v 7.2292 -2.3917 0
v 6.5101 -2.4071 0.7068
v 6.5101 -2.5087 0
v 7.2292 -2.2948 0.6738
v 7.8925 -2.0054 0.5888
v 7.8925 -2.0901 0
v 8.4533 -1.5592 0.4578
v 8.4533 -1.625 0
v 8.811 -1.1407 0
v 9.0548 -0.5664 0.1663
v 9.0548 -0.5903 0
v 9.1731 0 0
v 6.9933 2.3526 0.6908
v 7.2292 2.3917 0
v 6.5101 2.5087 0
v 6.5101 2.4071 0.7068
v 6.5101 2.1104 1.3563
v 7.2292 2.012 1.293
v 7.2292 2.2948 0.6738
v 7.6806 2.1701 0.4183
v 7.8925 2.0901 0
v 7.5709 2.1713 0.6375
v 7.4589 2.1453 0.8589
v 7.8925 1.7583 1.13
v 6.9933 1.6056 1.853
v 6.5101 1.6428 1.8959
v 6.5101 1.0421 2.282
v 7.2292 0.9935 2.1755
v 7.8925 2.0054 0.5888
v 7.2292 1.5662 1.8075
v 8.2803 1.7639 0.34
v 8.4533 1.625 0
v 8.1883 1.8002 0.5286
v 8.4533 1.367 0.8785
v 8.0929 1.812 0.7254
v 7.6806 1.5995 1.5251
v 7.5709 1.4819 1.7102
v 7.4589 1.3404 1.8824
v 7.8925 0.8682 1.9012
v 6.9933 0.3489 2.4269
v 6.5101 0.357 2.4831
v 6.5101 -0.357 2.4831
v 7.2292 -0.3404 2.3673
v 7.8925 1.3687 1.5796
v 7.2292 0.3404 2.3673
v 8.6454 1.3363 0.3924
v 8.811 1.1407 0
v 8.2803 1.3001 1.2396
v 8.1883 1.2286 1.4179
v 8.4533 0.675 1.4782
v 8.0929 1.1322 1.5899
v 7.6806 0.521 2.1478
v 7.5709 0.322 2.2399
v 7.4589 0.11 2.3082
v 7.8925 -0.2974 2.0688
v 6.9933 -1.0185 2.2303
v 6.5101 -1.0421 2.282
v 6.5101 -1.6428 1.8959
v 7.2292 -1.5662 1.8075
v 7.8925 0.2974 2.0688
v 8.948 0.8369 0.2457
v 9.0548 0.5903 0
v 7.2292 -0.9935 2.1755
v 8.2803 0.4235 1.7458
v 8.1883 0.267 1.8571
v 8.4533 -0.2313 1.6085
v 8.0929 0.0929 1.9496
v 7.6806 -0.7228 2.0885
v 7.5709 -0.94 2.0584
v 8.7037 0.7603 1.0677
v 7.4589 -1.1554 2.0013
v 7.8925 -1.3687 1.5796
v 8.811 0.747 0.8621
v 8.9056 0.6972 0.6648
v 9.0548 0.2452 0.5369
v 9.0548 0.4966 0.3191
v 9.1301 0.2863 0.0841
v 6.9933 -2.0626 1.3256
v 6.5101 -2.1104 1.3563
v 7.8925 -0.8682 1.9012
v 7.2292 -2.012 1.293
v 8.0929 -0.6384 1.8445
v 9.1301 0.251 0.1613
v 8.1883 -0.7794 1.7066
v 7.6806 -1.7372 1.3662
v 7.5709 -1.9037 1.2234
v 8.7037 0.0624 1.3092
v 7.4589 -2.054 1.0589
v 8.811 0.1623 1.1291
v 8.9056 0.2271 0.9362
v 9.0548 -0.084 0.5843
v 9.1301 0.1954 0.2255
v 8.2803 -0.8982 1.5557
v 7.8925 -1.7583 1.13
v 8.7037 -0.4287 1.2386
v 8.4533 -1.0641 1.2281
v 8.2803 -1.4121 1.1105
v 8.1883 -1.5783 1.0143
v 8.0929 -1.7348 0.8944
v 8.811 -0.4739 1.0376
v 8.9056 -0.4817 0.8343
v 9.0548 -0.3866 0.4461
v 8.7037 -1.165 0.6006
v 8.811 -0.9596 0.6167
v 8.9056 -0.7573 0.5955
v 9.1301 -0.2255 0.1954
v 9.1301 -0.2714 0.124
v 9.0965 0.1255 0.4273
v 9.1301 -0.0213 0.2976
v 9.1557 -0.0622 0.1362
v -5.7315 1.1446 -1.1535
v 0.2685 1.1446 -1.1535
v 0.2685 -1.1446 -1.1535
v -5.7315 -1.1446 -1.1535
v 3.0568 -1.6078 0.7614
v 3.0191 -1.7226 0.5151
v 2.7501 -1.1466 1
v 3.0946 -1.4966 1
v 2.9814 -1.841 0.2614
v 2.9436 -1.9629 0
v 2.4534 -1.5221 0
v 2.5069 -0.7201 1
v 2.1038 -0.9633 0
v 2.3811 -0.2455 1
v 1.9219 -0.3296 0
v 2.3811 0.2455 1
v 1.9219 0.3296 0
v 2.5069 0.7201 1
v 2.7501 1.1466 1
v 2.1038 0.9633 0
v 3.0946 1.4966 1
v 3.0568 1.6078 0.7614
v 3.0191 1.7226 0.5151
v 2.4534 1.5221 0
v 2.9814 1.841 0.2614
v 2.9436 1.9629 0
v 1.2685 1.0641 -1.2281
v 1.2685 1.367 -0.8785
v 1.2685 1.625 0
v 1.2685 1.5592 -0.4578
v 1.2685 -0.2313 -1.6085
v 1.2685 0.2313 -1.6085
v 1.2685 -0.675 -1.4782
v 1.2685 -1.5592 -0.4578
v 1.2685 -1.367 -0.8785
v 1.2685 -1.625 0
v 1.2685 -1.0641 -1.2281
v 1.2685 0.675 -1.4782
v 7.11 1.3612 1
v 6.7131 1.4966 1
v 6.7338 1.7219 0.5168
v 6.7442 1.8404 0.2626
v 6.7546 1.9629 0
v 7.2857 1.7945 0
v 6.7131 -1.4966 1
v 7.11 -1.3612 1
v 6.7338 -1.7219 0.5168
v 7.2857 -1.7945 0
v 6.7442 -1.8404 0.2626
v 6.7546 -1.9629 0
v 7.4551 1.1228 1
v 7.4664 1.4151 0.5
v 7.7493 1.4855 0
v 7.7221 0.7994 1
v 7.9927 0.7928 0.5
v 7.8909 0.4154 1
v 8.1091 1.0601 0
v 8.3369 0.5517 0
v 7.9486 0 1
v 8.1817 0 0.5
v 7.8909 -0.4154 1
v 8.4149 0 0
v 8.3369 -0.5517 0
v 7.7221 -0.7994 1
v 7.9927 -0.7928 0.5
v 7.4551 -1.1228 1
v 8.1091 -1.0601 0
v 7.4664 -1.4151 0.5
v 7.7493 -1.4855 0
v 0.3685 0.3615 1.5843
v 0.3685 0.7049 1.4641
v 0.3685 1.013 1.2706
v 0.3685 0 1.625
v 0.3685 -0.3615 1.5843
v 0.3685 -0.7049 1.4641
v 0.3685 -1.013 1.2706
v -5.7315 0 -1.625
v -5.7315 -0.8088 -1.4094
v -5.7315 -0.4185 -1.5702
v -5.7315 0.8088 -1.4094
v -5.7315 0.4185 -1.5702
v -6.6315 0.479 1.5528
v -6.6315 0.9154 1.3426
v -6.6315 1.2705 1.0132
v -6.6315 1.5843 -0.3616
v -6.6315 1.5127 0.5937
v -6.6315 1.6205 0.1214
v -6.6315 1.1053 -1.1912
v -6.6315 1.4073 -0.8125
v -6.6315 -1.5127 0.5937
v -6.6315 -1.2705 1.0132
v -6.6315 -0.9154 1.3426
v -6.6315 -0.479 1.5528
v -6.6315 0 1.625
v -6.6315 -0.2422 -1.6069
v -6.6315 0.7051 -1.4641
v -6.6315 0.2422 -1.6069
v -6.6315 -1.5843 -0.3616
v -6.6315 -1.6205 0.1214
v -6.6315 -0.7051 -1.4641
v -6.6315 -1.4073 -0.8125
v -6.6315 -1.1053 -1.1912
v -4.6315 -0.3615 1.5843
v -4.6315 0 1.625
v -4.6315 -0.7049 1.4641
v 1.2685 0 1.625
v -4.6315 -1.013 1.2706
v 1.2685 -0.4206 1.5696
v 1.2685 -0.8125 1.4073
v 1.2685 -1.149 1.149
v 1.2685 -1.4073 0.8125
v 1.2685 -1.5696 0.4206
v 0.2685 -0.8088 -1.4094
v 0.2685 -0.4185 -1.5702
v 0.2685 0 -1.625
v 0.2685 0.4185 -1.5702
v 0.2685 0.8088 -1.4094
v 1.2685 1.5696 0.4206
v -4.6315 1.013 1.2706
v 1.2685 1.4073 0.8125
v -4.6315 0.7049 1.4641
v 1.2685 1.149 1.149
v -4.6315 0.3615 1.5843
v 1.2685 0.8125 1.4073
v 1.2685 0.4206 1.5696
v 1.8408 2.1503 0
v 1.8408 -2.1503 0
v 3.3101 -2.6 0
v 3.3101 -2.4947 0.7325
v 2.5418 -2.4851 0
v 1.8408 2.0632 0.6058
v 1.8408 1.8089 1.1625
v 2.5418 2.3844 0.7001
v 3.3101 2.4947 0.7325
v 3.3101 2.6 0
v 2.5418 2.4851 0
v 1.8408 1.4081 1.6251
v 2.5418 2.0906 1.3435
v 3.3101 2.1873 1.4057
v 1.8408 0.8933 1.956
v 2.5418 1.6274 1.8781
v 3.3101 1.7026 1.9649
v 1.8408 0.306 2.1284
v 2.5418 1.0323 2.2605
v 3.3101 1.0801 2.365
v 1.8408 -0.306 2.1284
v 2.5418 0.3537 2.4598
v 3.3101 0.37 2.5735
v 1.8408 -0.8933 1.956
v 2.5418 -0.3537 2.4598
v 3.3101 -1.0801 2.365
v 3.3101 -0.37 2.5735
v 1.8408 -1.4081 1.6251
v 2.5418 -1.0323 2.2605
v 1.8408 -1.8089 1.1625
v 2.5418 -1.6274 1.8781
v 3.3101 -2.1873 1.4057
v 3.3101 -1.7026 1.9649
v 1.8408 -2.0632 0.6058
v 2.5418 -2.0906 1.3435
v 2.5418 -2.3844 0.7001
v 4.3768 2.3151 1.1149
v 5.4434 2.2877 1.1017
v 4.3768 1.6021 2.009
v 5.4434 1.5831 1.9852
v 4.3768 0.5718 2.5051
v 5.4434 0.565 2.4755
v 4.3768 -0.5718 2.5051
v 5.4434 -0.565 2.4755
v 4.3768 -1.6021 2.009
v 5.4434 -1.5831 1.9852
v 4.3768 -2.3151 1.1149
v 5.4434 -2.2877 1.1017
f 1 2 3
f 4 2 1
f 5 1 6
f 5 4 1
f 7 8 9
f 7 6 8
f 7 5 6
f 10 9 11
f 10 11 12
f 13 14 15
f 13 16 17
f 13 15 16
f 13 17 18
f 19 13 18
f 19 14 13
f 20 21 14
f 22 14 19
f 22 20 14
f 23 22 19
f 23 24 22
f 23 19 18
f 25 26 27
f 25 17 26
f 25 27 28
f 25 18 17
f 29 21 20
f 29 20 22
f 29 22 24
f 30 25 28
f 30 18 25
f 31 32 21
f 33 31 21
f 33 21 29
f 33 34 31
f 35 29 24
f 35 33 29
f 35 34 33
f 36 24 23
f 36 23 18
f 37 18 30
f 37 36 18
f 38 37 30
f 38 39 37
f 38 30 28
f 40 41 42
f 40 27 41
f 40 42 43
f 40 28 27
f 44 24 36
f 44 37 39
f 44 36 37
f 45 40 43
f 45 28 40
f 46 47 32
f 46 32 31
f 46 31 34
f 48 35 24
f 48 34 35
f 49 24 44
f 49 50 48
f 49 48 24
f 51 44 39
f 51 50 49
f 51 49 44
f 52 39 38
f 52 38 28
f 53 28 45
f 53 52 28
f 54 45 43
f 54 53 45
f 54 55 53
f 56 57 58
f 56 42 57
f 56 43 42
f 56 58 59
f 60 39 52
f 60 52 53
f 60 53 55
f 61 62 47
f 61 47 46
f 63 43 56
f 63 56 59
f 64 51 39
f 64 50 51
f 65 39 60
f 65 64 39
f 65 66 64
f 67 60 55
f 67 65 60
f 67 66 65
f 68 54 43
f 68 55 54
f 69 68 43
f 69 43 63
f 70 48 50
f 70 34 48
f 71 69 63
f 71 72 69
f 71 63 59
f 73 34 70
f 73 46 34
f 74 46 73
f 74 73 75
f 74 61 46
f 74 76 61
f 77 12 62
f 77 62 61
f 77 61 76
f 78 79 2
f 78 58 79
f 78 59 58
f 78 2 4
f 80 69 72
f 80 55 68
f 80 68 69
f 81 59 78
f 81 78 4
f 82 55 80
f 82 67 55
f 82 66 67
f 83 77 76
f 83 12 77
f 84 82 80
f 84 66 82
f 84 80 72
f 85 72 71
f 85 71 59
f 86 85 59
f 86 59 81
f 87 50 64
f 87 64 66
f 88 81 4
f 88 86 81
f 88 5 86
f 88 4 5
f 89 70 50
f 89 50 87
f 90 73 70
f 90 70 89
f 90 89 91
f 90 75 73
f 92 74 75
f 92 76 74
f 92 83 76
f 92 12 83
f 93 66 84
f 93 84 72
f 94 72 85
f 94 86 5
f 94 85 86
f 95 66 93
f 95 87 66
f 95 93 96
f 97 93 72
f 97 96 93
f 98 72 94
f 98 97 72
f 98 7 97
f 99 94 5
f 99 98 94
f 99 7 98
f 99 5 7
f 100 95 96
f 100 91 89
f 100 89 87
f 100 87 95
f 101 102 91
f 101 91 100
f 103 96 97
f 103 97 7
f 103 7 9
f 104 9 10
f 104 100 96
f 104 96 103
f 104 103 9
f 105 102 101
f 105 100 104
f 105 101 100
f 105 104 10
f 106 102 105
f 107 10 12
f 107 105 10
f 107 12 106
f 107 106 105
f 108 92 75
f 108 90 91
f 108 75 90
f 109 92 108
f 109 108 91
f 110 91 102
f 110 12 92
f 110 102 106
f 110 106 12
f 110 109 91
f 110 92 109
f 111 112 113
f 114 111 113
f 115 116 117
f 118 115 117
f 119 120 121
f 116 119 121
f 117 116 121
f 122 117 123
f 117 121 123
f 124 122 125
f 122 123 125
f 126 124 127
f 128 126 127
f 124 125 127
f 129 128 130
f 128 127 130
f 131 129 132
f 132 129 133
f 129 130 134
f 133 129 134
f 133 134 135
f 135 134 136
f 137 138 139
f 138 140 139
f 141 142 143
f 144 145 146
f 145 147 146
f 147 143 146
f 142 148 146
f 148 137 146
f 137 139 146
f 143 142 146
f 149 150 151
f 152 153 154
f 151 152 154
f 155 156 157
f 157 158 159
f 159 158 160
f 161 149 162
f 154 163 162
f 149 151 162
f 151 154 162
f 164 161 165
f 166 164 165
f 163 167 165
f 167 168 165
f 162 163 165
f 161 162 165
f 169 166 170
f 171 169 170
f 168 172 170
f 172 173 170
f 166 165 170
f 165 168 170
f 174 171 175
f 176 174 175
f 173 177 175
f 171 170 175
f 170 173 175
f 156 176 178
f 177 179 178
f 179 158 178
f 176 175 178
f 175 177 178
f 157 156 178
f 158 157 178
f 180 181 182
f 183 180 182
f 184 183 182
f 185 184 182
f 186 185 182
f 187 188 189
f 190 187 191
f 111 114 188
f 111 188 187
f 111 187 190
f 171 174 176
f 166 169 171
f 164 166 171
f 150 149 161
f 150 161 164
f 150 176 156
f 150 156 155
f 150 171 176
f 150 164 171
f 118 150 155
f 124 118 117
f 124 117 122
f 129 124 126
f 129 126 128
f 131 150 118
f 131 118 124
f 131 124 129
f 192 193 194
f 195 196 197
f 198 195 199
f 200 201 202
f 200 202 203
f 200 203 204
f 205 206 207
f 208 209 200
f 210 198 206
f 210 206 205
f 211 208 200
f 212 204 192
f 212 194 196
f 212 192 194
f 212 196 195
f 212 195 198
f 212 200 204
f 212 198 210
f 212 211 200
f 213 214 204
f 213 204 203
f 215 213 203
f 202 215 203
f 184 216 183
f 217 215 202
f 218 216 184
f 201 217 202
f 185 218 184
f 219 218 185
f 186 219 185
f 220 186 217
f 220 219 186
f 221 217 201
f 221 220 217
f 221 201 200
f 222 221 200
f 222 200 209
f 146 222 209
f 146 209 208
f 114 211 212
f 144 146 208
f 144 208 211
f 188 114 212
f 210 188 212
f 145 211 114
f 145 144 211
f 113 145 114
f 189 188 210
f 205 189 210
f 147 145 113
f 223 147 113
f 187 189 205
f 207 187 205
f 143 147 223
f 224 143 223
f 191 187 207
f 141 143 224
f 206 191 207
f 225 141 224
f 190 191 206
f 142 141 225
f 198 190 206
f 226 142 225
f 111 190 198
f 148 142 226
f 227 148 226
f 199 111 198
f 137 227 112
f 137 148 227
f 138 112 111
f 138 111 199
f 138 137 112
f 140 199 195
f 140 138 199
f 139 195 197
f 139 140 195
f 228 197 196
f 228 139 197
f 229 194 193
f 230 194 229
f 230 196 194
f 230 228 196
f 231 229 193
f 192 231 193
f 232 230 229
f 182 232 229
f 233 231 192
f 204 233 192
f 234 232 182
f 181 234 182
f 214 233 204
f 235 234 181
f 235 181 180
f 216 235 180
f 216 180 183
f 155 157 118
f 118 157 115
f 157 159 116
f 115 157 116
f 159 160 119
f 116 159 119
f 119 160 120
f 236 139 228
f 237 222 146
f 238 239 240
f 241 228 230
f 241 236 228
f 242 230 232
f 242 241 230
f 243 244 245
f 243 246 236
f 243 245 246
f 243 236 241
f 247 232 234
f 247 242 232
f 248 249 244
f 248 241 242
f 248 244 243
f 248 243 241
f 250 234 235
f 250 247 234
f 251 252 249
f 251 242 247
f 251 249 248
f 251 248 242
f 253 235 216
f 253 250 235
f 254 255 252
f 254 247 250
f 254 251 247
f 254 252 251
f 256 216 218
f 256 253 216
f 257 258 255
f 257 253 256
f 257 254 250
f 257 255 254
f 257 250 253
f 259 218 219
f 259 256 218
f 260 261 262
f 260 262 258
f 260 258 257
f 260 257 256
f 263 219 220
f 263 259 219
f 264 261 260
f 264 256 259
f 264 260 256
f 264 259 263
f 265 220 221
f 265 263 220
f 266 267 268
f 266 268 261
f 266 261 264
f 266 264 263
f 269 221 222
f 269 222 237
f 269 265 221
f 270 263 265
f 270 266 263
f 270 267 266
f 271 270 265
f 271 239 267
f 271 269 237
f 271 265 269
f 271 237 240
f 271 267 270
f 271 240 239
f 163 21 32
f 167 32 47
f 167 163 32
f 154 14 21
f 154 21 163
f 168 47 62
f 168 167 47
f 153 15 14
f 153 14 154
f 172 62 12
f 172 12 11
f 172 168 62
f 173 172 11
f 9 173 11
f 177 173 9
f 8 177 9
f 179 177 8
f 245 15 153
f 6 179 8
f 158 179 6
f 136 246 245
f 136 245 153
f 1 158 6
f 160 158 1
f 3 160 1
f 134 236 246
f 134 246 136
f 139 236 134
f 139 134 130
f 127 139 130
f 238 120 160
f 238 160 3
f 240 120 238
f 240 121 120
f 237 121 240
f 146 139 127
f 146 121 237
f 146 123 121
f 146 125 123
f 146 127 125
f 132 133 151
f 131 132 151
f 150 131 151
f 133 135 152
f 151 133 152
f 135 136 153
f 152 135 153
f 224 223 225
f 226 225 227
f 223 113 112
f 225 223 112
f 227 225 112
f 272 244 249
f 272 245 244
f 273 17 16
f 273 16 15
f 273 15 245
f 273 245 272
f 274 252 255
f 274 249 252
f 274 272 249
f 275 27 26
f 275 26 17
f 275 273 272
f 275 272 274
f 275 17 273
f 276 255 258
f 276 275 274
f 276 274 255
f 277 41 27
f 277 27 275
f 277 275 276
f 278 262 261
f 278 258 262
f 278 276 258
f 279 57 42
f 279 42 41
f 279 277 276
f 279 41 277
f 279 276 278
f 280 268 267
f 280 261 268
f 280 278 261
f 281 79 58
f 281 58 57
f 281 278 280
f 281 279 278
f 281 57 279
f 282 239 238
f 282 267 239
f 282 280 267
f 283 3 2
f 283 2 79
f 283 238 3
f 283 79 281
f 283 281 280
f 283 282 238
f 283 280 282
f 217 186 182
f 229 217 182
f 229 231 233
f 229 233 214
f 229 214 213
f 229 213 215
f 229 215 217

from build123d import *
from build123d.topology import SkipClean

# Parameters (mm, degrees)
CUT_EXTRUDE3_DEPTH = 17.226666346
CUT_EXTRUDE4_DEPTH = 10.882576389
CUT_EXTRUDE5_DEPTH = 1
CUT_EXTRUDE5_DRAFT = -25
CUT_EXTRUDE7_START = -7
CUT_EXTRUDE7_DEPTH = 5
CUT_EXTRUDE8_START = -1
CUT_EXTRUDE8_DEPTH = 6


with BuildPart() as part:
    # Sketch2 → Revolve1 (revolve)
    with BuildSketch(Plane.XY, mode=Mode.PRIVATE) as revolve1_sk:
        with BuildLine():
            Line((-6.63150289, 0), (-6.63150289, 1.625))
            Line((-6.63150289, 1.625), (1.26849711, 1.625))
            ThreePointArc((1.26849711, 1.625), (2.178863013, 2.343741755), (3.310095748, 2.6))
            Line((3.310095748, 2.6), (6.510095748, 2.50867829))
            ThreePointArc((6.510095748, 2.50867829), (8.318770507, 1.760874291), (9.17307545, 0))
            Line((9.17307545, 0), (-6.63150289, 0))
        make_face()
    revolve(revolve1_sk.sketch.rotate(Axis((-13.79438497, 0, 0), (1, 0, 0)), 90), axis=Axis((-13.79438497, 0, 0), (1, 0, 0)))

    # Sketch8 → Cut-Extrude3 (cut, through all)
    with SkipClean():  # the faces are left unmerged after this step: merging them gives an invalid solid
        with BuildSketch(Plane.ZY.offset(6.63150289)):
            with BuildLine():
                Line((0, -1.625), (0, -2.6))
                ThreePointArc((0, -2.6), (-2.6, 0), (0, 2.6))
                Line((0, 2.6), (0, 1.625))
                ThreePointArc((0, 1.625), (-1.625, 0), (0, -1.625))
            make_face()
        extrude(amount=-CUT_EXTRUDE3_DEPTH, mode=Mode.SUBTRACT)

    # Sketch9 → Cut-Extrude4 (cut, through all)
    with SkipClean():  # the faces are left unmerged after this step: merging them gives an invalid solid
        with BuildSketch(Plane(origin=(0, 0, 0), x_dir=(-1, 0, 0), z_dir=(0, 0, -1))):
            with BuildLine():
                Line((-1.26849711, 1.625), (-1.26849711, -1.625))
                Line((-1.26849711, -1.625), (-2.014389305, -1.625))
                ThreePointArc((-2.014389305, -1.625), (-4.93682915, -1.903834504), (-7.859268995, -1.625))
                Line((-7.859268995, -1.625), (-8.453314596, -1.625))
                ThreePointArc((-8.453314596, -1.625), (-9.31617507, 0), (-8.453314596, 1.625))
                Line((-8.453314596, 1.625), (-7.859268995, 1.625))
                ThreePointArc((-7.859268995, 1.625), (-4.926626022, 1.952572443), (-1.993983049, 1.625))
                Line((-1.993983049, 1.625), (-1.26849711, 1.625))
            make_face()
        extrude(amount=CUT_EXTRUDE4_DEPTH, mode=Mode.SUBTRACT)


with BuildPart() as cut_extrude5_tool:
    # Sketch10 → Cut-Extrude5 (with draft: the straight prism first)
    with BuildSketch(Plane(origin=(0, 0, 0), x_dir=(-1, 0, 0), z_dir=(0, 0, -1))):
        with BuildLine():
            ThreePointArc((-6.754616043, 1.962865993), (-8.41489063, 0), (-6.754616043, -1.962865993))
            Line((-6.754616043, -1.962865993), (-2.943623614, -1.962865993))
            ThreePointArc((-2.943623614, -1.962865993), (-1.898821514, 0), (-2.943623614, 1.962865993))
            Line((-2.943623614, 1.962865993), (-6.754616043, 1.962865993))
        make_face()
    extrude(amount=-CUT_EXTRUDE5_DEPTH)
    # Cut-Extrude5: the draft: its side faces are tilted about the plane it starts from
    cut_extrude5_sides = [cut_extrude5_tool.faces().sort_by_distance(p)[0] for p in [
        (4.849119829, -1.962865993, 0.5),
        (1.898821514, 0, 0.5),
        (4.849119829, 1.962865993, 0.5),
        (8.41489063, 0, 0.5),
    ]]
    draft(cut_extrude5_sides, Plane(origin=(0, 0, 0), x_dir=(-1, 0, 0), z_dir=(0, 0, -1)), CUT_EXTRUDE5_DRAFT)


with BuildPart() as part_1:
    add(part.part)

    # Cut-Extrude5: cut by cut_extrude5_tool
    add(cut_extrude5_tool.part, mode=Mode.SUBTRACT)

    # Sketch13 → Cut-Extrude7 (cut)
    with BuildSketch(Plane.ZY.offset(6.63150289).offset(CUT_EXTRUDE7_START)):
        with BuildLine():
            Line((1.270607087, -1.013006727), (1.270607087, 1.013006727))
            ThreePointArc((1.270607087, 1.013006727), (1.625, 0), (1.270607087, -1.013006727))
        make_face()
    extrude(amount=CUT_EXTRUDE7_DEPTH, mode=Mode.SUBTRACT)

    # Sketch14 → Cut-Extrude8 (cut)
    with BuildSketch(Plane(origin=(1.26849711, 0, 0), x_dir=(0, 0, -1), z_dir=(1, 0, 0)).offset(CUT_EXTRUDE8_START)):
        with BuildLine():
            Line((1.153512248, 1.144567383), (1.153512248, -1.144567383))
            ThreePointArc((1.153512248, -1.144567383), (1.625, 0), (1.153512248, 1.144567383))
        make_face()
    extrude(amount=-CUT_EXTRUDE8_DEPTH, mode=Mode.SUBTRACT)


solid = part_1.part
